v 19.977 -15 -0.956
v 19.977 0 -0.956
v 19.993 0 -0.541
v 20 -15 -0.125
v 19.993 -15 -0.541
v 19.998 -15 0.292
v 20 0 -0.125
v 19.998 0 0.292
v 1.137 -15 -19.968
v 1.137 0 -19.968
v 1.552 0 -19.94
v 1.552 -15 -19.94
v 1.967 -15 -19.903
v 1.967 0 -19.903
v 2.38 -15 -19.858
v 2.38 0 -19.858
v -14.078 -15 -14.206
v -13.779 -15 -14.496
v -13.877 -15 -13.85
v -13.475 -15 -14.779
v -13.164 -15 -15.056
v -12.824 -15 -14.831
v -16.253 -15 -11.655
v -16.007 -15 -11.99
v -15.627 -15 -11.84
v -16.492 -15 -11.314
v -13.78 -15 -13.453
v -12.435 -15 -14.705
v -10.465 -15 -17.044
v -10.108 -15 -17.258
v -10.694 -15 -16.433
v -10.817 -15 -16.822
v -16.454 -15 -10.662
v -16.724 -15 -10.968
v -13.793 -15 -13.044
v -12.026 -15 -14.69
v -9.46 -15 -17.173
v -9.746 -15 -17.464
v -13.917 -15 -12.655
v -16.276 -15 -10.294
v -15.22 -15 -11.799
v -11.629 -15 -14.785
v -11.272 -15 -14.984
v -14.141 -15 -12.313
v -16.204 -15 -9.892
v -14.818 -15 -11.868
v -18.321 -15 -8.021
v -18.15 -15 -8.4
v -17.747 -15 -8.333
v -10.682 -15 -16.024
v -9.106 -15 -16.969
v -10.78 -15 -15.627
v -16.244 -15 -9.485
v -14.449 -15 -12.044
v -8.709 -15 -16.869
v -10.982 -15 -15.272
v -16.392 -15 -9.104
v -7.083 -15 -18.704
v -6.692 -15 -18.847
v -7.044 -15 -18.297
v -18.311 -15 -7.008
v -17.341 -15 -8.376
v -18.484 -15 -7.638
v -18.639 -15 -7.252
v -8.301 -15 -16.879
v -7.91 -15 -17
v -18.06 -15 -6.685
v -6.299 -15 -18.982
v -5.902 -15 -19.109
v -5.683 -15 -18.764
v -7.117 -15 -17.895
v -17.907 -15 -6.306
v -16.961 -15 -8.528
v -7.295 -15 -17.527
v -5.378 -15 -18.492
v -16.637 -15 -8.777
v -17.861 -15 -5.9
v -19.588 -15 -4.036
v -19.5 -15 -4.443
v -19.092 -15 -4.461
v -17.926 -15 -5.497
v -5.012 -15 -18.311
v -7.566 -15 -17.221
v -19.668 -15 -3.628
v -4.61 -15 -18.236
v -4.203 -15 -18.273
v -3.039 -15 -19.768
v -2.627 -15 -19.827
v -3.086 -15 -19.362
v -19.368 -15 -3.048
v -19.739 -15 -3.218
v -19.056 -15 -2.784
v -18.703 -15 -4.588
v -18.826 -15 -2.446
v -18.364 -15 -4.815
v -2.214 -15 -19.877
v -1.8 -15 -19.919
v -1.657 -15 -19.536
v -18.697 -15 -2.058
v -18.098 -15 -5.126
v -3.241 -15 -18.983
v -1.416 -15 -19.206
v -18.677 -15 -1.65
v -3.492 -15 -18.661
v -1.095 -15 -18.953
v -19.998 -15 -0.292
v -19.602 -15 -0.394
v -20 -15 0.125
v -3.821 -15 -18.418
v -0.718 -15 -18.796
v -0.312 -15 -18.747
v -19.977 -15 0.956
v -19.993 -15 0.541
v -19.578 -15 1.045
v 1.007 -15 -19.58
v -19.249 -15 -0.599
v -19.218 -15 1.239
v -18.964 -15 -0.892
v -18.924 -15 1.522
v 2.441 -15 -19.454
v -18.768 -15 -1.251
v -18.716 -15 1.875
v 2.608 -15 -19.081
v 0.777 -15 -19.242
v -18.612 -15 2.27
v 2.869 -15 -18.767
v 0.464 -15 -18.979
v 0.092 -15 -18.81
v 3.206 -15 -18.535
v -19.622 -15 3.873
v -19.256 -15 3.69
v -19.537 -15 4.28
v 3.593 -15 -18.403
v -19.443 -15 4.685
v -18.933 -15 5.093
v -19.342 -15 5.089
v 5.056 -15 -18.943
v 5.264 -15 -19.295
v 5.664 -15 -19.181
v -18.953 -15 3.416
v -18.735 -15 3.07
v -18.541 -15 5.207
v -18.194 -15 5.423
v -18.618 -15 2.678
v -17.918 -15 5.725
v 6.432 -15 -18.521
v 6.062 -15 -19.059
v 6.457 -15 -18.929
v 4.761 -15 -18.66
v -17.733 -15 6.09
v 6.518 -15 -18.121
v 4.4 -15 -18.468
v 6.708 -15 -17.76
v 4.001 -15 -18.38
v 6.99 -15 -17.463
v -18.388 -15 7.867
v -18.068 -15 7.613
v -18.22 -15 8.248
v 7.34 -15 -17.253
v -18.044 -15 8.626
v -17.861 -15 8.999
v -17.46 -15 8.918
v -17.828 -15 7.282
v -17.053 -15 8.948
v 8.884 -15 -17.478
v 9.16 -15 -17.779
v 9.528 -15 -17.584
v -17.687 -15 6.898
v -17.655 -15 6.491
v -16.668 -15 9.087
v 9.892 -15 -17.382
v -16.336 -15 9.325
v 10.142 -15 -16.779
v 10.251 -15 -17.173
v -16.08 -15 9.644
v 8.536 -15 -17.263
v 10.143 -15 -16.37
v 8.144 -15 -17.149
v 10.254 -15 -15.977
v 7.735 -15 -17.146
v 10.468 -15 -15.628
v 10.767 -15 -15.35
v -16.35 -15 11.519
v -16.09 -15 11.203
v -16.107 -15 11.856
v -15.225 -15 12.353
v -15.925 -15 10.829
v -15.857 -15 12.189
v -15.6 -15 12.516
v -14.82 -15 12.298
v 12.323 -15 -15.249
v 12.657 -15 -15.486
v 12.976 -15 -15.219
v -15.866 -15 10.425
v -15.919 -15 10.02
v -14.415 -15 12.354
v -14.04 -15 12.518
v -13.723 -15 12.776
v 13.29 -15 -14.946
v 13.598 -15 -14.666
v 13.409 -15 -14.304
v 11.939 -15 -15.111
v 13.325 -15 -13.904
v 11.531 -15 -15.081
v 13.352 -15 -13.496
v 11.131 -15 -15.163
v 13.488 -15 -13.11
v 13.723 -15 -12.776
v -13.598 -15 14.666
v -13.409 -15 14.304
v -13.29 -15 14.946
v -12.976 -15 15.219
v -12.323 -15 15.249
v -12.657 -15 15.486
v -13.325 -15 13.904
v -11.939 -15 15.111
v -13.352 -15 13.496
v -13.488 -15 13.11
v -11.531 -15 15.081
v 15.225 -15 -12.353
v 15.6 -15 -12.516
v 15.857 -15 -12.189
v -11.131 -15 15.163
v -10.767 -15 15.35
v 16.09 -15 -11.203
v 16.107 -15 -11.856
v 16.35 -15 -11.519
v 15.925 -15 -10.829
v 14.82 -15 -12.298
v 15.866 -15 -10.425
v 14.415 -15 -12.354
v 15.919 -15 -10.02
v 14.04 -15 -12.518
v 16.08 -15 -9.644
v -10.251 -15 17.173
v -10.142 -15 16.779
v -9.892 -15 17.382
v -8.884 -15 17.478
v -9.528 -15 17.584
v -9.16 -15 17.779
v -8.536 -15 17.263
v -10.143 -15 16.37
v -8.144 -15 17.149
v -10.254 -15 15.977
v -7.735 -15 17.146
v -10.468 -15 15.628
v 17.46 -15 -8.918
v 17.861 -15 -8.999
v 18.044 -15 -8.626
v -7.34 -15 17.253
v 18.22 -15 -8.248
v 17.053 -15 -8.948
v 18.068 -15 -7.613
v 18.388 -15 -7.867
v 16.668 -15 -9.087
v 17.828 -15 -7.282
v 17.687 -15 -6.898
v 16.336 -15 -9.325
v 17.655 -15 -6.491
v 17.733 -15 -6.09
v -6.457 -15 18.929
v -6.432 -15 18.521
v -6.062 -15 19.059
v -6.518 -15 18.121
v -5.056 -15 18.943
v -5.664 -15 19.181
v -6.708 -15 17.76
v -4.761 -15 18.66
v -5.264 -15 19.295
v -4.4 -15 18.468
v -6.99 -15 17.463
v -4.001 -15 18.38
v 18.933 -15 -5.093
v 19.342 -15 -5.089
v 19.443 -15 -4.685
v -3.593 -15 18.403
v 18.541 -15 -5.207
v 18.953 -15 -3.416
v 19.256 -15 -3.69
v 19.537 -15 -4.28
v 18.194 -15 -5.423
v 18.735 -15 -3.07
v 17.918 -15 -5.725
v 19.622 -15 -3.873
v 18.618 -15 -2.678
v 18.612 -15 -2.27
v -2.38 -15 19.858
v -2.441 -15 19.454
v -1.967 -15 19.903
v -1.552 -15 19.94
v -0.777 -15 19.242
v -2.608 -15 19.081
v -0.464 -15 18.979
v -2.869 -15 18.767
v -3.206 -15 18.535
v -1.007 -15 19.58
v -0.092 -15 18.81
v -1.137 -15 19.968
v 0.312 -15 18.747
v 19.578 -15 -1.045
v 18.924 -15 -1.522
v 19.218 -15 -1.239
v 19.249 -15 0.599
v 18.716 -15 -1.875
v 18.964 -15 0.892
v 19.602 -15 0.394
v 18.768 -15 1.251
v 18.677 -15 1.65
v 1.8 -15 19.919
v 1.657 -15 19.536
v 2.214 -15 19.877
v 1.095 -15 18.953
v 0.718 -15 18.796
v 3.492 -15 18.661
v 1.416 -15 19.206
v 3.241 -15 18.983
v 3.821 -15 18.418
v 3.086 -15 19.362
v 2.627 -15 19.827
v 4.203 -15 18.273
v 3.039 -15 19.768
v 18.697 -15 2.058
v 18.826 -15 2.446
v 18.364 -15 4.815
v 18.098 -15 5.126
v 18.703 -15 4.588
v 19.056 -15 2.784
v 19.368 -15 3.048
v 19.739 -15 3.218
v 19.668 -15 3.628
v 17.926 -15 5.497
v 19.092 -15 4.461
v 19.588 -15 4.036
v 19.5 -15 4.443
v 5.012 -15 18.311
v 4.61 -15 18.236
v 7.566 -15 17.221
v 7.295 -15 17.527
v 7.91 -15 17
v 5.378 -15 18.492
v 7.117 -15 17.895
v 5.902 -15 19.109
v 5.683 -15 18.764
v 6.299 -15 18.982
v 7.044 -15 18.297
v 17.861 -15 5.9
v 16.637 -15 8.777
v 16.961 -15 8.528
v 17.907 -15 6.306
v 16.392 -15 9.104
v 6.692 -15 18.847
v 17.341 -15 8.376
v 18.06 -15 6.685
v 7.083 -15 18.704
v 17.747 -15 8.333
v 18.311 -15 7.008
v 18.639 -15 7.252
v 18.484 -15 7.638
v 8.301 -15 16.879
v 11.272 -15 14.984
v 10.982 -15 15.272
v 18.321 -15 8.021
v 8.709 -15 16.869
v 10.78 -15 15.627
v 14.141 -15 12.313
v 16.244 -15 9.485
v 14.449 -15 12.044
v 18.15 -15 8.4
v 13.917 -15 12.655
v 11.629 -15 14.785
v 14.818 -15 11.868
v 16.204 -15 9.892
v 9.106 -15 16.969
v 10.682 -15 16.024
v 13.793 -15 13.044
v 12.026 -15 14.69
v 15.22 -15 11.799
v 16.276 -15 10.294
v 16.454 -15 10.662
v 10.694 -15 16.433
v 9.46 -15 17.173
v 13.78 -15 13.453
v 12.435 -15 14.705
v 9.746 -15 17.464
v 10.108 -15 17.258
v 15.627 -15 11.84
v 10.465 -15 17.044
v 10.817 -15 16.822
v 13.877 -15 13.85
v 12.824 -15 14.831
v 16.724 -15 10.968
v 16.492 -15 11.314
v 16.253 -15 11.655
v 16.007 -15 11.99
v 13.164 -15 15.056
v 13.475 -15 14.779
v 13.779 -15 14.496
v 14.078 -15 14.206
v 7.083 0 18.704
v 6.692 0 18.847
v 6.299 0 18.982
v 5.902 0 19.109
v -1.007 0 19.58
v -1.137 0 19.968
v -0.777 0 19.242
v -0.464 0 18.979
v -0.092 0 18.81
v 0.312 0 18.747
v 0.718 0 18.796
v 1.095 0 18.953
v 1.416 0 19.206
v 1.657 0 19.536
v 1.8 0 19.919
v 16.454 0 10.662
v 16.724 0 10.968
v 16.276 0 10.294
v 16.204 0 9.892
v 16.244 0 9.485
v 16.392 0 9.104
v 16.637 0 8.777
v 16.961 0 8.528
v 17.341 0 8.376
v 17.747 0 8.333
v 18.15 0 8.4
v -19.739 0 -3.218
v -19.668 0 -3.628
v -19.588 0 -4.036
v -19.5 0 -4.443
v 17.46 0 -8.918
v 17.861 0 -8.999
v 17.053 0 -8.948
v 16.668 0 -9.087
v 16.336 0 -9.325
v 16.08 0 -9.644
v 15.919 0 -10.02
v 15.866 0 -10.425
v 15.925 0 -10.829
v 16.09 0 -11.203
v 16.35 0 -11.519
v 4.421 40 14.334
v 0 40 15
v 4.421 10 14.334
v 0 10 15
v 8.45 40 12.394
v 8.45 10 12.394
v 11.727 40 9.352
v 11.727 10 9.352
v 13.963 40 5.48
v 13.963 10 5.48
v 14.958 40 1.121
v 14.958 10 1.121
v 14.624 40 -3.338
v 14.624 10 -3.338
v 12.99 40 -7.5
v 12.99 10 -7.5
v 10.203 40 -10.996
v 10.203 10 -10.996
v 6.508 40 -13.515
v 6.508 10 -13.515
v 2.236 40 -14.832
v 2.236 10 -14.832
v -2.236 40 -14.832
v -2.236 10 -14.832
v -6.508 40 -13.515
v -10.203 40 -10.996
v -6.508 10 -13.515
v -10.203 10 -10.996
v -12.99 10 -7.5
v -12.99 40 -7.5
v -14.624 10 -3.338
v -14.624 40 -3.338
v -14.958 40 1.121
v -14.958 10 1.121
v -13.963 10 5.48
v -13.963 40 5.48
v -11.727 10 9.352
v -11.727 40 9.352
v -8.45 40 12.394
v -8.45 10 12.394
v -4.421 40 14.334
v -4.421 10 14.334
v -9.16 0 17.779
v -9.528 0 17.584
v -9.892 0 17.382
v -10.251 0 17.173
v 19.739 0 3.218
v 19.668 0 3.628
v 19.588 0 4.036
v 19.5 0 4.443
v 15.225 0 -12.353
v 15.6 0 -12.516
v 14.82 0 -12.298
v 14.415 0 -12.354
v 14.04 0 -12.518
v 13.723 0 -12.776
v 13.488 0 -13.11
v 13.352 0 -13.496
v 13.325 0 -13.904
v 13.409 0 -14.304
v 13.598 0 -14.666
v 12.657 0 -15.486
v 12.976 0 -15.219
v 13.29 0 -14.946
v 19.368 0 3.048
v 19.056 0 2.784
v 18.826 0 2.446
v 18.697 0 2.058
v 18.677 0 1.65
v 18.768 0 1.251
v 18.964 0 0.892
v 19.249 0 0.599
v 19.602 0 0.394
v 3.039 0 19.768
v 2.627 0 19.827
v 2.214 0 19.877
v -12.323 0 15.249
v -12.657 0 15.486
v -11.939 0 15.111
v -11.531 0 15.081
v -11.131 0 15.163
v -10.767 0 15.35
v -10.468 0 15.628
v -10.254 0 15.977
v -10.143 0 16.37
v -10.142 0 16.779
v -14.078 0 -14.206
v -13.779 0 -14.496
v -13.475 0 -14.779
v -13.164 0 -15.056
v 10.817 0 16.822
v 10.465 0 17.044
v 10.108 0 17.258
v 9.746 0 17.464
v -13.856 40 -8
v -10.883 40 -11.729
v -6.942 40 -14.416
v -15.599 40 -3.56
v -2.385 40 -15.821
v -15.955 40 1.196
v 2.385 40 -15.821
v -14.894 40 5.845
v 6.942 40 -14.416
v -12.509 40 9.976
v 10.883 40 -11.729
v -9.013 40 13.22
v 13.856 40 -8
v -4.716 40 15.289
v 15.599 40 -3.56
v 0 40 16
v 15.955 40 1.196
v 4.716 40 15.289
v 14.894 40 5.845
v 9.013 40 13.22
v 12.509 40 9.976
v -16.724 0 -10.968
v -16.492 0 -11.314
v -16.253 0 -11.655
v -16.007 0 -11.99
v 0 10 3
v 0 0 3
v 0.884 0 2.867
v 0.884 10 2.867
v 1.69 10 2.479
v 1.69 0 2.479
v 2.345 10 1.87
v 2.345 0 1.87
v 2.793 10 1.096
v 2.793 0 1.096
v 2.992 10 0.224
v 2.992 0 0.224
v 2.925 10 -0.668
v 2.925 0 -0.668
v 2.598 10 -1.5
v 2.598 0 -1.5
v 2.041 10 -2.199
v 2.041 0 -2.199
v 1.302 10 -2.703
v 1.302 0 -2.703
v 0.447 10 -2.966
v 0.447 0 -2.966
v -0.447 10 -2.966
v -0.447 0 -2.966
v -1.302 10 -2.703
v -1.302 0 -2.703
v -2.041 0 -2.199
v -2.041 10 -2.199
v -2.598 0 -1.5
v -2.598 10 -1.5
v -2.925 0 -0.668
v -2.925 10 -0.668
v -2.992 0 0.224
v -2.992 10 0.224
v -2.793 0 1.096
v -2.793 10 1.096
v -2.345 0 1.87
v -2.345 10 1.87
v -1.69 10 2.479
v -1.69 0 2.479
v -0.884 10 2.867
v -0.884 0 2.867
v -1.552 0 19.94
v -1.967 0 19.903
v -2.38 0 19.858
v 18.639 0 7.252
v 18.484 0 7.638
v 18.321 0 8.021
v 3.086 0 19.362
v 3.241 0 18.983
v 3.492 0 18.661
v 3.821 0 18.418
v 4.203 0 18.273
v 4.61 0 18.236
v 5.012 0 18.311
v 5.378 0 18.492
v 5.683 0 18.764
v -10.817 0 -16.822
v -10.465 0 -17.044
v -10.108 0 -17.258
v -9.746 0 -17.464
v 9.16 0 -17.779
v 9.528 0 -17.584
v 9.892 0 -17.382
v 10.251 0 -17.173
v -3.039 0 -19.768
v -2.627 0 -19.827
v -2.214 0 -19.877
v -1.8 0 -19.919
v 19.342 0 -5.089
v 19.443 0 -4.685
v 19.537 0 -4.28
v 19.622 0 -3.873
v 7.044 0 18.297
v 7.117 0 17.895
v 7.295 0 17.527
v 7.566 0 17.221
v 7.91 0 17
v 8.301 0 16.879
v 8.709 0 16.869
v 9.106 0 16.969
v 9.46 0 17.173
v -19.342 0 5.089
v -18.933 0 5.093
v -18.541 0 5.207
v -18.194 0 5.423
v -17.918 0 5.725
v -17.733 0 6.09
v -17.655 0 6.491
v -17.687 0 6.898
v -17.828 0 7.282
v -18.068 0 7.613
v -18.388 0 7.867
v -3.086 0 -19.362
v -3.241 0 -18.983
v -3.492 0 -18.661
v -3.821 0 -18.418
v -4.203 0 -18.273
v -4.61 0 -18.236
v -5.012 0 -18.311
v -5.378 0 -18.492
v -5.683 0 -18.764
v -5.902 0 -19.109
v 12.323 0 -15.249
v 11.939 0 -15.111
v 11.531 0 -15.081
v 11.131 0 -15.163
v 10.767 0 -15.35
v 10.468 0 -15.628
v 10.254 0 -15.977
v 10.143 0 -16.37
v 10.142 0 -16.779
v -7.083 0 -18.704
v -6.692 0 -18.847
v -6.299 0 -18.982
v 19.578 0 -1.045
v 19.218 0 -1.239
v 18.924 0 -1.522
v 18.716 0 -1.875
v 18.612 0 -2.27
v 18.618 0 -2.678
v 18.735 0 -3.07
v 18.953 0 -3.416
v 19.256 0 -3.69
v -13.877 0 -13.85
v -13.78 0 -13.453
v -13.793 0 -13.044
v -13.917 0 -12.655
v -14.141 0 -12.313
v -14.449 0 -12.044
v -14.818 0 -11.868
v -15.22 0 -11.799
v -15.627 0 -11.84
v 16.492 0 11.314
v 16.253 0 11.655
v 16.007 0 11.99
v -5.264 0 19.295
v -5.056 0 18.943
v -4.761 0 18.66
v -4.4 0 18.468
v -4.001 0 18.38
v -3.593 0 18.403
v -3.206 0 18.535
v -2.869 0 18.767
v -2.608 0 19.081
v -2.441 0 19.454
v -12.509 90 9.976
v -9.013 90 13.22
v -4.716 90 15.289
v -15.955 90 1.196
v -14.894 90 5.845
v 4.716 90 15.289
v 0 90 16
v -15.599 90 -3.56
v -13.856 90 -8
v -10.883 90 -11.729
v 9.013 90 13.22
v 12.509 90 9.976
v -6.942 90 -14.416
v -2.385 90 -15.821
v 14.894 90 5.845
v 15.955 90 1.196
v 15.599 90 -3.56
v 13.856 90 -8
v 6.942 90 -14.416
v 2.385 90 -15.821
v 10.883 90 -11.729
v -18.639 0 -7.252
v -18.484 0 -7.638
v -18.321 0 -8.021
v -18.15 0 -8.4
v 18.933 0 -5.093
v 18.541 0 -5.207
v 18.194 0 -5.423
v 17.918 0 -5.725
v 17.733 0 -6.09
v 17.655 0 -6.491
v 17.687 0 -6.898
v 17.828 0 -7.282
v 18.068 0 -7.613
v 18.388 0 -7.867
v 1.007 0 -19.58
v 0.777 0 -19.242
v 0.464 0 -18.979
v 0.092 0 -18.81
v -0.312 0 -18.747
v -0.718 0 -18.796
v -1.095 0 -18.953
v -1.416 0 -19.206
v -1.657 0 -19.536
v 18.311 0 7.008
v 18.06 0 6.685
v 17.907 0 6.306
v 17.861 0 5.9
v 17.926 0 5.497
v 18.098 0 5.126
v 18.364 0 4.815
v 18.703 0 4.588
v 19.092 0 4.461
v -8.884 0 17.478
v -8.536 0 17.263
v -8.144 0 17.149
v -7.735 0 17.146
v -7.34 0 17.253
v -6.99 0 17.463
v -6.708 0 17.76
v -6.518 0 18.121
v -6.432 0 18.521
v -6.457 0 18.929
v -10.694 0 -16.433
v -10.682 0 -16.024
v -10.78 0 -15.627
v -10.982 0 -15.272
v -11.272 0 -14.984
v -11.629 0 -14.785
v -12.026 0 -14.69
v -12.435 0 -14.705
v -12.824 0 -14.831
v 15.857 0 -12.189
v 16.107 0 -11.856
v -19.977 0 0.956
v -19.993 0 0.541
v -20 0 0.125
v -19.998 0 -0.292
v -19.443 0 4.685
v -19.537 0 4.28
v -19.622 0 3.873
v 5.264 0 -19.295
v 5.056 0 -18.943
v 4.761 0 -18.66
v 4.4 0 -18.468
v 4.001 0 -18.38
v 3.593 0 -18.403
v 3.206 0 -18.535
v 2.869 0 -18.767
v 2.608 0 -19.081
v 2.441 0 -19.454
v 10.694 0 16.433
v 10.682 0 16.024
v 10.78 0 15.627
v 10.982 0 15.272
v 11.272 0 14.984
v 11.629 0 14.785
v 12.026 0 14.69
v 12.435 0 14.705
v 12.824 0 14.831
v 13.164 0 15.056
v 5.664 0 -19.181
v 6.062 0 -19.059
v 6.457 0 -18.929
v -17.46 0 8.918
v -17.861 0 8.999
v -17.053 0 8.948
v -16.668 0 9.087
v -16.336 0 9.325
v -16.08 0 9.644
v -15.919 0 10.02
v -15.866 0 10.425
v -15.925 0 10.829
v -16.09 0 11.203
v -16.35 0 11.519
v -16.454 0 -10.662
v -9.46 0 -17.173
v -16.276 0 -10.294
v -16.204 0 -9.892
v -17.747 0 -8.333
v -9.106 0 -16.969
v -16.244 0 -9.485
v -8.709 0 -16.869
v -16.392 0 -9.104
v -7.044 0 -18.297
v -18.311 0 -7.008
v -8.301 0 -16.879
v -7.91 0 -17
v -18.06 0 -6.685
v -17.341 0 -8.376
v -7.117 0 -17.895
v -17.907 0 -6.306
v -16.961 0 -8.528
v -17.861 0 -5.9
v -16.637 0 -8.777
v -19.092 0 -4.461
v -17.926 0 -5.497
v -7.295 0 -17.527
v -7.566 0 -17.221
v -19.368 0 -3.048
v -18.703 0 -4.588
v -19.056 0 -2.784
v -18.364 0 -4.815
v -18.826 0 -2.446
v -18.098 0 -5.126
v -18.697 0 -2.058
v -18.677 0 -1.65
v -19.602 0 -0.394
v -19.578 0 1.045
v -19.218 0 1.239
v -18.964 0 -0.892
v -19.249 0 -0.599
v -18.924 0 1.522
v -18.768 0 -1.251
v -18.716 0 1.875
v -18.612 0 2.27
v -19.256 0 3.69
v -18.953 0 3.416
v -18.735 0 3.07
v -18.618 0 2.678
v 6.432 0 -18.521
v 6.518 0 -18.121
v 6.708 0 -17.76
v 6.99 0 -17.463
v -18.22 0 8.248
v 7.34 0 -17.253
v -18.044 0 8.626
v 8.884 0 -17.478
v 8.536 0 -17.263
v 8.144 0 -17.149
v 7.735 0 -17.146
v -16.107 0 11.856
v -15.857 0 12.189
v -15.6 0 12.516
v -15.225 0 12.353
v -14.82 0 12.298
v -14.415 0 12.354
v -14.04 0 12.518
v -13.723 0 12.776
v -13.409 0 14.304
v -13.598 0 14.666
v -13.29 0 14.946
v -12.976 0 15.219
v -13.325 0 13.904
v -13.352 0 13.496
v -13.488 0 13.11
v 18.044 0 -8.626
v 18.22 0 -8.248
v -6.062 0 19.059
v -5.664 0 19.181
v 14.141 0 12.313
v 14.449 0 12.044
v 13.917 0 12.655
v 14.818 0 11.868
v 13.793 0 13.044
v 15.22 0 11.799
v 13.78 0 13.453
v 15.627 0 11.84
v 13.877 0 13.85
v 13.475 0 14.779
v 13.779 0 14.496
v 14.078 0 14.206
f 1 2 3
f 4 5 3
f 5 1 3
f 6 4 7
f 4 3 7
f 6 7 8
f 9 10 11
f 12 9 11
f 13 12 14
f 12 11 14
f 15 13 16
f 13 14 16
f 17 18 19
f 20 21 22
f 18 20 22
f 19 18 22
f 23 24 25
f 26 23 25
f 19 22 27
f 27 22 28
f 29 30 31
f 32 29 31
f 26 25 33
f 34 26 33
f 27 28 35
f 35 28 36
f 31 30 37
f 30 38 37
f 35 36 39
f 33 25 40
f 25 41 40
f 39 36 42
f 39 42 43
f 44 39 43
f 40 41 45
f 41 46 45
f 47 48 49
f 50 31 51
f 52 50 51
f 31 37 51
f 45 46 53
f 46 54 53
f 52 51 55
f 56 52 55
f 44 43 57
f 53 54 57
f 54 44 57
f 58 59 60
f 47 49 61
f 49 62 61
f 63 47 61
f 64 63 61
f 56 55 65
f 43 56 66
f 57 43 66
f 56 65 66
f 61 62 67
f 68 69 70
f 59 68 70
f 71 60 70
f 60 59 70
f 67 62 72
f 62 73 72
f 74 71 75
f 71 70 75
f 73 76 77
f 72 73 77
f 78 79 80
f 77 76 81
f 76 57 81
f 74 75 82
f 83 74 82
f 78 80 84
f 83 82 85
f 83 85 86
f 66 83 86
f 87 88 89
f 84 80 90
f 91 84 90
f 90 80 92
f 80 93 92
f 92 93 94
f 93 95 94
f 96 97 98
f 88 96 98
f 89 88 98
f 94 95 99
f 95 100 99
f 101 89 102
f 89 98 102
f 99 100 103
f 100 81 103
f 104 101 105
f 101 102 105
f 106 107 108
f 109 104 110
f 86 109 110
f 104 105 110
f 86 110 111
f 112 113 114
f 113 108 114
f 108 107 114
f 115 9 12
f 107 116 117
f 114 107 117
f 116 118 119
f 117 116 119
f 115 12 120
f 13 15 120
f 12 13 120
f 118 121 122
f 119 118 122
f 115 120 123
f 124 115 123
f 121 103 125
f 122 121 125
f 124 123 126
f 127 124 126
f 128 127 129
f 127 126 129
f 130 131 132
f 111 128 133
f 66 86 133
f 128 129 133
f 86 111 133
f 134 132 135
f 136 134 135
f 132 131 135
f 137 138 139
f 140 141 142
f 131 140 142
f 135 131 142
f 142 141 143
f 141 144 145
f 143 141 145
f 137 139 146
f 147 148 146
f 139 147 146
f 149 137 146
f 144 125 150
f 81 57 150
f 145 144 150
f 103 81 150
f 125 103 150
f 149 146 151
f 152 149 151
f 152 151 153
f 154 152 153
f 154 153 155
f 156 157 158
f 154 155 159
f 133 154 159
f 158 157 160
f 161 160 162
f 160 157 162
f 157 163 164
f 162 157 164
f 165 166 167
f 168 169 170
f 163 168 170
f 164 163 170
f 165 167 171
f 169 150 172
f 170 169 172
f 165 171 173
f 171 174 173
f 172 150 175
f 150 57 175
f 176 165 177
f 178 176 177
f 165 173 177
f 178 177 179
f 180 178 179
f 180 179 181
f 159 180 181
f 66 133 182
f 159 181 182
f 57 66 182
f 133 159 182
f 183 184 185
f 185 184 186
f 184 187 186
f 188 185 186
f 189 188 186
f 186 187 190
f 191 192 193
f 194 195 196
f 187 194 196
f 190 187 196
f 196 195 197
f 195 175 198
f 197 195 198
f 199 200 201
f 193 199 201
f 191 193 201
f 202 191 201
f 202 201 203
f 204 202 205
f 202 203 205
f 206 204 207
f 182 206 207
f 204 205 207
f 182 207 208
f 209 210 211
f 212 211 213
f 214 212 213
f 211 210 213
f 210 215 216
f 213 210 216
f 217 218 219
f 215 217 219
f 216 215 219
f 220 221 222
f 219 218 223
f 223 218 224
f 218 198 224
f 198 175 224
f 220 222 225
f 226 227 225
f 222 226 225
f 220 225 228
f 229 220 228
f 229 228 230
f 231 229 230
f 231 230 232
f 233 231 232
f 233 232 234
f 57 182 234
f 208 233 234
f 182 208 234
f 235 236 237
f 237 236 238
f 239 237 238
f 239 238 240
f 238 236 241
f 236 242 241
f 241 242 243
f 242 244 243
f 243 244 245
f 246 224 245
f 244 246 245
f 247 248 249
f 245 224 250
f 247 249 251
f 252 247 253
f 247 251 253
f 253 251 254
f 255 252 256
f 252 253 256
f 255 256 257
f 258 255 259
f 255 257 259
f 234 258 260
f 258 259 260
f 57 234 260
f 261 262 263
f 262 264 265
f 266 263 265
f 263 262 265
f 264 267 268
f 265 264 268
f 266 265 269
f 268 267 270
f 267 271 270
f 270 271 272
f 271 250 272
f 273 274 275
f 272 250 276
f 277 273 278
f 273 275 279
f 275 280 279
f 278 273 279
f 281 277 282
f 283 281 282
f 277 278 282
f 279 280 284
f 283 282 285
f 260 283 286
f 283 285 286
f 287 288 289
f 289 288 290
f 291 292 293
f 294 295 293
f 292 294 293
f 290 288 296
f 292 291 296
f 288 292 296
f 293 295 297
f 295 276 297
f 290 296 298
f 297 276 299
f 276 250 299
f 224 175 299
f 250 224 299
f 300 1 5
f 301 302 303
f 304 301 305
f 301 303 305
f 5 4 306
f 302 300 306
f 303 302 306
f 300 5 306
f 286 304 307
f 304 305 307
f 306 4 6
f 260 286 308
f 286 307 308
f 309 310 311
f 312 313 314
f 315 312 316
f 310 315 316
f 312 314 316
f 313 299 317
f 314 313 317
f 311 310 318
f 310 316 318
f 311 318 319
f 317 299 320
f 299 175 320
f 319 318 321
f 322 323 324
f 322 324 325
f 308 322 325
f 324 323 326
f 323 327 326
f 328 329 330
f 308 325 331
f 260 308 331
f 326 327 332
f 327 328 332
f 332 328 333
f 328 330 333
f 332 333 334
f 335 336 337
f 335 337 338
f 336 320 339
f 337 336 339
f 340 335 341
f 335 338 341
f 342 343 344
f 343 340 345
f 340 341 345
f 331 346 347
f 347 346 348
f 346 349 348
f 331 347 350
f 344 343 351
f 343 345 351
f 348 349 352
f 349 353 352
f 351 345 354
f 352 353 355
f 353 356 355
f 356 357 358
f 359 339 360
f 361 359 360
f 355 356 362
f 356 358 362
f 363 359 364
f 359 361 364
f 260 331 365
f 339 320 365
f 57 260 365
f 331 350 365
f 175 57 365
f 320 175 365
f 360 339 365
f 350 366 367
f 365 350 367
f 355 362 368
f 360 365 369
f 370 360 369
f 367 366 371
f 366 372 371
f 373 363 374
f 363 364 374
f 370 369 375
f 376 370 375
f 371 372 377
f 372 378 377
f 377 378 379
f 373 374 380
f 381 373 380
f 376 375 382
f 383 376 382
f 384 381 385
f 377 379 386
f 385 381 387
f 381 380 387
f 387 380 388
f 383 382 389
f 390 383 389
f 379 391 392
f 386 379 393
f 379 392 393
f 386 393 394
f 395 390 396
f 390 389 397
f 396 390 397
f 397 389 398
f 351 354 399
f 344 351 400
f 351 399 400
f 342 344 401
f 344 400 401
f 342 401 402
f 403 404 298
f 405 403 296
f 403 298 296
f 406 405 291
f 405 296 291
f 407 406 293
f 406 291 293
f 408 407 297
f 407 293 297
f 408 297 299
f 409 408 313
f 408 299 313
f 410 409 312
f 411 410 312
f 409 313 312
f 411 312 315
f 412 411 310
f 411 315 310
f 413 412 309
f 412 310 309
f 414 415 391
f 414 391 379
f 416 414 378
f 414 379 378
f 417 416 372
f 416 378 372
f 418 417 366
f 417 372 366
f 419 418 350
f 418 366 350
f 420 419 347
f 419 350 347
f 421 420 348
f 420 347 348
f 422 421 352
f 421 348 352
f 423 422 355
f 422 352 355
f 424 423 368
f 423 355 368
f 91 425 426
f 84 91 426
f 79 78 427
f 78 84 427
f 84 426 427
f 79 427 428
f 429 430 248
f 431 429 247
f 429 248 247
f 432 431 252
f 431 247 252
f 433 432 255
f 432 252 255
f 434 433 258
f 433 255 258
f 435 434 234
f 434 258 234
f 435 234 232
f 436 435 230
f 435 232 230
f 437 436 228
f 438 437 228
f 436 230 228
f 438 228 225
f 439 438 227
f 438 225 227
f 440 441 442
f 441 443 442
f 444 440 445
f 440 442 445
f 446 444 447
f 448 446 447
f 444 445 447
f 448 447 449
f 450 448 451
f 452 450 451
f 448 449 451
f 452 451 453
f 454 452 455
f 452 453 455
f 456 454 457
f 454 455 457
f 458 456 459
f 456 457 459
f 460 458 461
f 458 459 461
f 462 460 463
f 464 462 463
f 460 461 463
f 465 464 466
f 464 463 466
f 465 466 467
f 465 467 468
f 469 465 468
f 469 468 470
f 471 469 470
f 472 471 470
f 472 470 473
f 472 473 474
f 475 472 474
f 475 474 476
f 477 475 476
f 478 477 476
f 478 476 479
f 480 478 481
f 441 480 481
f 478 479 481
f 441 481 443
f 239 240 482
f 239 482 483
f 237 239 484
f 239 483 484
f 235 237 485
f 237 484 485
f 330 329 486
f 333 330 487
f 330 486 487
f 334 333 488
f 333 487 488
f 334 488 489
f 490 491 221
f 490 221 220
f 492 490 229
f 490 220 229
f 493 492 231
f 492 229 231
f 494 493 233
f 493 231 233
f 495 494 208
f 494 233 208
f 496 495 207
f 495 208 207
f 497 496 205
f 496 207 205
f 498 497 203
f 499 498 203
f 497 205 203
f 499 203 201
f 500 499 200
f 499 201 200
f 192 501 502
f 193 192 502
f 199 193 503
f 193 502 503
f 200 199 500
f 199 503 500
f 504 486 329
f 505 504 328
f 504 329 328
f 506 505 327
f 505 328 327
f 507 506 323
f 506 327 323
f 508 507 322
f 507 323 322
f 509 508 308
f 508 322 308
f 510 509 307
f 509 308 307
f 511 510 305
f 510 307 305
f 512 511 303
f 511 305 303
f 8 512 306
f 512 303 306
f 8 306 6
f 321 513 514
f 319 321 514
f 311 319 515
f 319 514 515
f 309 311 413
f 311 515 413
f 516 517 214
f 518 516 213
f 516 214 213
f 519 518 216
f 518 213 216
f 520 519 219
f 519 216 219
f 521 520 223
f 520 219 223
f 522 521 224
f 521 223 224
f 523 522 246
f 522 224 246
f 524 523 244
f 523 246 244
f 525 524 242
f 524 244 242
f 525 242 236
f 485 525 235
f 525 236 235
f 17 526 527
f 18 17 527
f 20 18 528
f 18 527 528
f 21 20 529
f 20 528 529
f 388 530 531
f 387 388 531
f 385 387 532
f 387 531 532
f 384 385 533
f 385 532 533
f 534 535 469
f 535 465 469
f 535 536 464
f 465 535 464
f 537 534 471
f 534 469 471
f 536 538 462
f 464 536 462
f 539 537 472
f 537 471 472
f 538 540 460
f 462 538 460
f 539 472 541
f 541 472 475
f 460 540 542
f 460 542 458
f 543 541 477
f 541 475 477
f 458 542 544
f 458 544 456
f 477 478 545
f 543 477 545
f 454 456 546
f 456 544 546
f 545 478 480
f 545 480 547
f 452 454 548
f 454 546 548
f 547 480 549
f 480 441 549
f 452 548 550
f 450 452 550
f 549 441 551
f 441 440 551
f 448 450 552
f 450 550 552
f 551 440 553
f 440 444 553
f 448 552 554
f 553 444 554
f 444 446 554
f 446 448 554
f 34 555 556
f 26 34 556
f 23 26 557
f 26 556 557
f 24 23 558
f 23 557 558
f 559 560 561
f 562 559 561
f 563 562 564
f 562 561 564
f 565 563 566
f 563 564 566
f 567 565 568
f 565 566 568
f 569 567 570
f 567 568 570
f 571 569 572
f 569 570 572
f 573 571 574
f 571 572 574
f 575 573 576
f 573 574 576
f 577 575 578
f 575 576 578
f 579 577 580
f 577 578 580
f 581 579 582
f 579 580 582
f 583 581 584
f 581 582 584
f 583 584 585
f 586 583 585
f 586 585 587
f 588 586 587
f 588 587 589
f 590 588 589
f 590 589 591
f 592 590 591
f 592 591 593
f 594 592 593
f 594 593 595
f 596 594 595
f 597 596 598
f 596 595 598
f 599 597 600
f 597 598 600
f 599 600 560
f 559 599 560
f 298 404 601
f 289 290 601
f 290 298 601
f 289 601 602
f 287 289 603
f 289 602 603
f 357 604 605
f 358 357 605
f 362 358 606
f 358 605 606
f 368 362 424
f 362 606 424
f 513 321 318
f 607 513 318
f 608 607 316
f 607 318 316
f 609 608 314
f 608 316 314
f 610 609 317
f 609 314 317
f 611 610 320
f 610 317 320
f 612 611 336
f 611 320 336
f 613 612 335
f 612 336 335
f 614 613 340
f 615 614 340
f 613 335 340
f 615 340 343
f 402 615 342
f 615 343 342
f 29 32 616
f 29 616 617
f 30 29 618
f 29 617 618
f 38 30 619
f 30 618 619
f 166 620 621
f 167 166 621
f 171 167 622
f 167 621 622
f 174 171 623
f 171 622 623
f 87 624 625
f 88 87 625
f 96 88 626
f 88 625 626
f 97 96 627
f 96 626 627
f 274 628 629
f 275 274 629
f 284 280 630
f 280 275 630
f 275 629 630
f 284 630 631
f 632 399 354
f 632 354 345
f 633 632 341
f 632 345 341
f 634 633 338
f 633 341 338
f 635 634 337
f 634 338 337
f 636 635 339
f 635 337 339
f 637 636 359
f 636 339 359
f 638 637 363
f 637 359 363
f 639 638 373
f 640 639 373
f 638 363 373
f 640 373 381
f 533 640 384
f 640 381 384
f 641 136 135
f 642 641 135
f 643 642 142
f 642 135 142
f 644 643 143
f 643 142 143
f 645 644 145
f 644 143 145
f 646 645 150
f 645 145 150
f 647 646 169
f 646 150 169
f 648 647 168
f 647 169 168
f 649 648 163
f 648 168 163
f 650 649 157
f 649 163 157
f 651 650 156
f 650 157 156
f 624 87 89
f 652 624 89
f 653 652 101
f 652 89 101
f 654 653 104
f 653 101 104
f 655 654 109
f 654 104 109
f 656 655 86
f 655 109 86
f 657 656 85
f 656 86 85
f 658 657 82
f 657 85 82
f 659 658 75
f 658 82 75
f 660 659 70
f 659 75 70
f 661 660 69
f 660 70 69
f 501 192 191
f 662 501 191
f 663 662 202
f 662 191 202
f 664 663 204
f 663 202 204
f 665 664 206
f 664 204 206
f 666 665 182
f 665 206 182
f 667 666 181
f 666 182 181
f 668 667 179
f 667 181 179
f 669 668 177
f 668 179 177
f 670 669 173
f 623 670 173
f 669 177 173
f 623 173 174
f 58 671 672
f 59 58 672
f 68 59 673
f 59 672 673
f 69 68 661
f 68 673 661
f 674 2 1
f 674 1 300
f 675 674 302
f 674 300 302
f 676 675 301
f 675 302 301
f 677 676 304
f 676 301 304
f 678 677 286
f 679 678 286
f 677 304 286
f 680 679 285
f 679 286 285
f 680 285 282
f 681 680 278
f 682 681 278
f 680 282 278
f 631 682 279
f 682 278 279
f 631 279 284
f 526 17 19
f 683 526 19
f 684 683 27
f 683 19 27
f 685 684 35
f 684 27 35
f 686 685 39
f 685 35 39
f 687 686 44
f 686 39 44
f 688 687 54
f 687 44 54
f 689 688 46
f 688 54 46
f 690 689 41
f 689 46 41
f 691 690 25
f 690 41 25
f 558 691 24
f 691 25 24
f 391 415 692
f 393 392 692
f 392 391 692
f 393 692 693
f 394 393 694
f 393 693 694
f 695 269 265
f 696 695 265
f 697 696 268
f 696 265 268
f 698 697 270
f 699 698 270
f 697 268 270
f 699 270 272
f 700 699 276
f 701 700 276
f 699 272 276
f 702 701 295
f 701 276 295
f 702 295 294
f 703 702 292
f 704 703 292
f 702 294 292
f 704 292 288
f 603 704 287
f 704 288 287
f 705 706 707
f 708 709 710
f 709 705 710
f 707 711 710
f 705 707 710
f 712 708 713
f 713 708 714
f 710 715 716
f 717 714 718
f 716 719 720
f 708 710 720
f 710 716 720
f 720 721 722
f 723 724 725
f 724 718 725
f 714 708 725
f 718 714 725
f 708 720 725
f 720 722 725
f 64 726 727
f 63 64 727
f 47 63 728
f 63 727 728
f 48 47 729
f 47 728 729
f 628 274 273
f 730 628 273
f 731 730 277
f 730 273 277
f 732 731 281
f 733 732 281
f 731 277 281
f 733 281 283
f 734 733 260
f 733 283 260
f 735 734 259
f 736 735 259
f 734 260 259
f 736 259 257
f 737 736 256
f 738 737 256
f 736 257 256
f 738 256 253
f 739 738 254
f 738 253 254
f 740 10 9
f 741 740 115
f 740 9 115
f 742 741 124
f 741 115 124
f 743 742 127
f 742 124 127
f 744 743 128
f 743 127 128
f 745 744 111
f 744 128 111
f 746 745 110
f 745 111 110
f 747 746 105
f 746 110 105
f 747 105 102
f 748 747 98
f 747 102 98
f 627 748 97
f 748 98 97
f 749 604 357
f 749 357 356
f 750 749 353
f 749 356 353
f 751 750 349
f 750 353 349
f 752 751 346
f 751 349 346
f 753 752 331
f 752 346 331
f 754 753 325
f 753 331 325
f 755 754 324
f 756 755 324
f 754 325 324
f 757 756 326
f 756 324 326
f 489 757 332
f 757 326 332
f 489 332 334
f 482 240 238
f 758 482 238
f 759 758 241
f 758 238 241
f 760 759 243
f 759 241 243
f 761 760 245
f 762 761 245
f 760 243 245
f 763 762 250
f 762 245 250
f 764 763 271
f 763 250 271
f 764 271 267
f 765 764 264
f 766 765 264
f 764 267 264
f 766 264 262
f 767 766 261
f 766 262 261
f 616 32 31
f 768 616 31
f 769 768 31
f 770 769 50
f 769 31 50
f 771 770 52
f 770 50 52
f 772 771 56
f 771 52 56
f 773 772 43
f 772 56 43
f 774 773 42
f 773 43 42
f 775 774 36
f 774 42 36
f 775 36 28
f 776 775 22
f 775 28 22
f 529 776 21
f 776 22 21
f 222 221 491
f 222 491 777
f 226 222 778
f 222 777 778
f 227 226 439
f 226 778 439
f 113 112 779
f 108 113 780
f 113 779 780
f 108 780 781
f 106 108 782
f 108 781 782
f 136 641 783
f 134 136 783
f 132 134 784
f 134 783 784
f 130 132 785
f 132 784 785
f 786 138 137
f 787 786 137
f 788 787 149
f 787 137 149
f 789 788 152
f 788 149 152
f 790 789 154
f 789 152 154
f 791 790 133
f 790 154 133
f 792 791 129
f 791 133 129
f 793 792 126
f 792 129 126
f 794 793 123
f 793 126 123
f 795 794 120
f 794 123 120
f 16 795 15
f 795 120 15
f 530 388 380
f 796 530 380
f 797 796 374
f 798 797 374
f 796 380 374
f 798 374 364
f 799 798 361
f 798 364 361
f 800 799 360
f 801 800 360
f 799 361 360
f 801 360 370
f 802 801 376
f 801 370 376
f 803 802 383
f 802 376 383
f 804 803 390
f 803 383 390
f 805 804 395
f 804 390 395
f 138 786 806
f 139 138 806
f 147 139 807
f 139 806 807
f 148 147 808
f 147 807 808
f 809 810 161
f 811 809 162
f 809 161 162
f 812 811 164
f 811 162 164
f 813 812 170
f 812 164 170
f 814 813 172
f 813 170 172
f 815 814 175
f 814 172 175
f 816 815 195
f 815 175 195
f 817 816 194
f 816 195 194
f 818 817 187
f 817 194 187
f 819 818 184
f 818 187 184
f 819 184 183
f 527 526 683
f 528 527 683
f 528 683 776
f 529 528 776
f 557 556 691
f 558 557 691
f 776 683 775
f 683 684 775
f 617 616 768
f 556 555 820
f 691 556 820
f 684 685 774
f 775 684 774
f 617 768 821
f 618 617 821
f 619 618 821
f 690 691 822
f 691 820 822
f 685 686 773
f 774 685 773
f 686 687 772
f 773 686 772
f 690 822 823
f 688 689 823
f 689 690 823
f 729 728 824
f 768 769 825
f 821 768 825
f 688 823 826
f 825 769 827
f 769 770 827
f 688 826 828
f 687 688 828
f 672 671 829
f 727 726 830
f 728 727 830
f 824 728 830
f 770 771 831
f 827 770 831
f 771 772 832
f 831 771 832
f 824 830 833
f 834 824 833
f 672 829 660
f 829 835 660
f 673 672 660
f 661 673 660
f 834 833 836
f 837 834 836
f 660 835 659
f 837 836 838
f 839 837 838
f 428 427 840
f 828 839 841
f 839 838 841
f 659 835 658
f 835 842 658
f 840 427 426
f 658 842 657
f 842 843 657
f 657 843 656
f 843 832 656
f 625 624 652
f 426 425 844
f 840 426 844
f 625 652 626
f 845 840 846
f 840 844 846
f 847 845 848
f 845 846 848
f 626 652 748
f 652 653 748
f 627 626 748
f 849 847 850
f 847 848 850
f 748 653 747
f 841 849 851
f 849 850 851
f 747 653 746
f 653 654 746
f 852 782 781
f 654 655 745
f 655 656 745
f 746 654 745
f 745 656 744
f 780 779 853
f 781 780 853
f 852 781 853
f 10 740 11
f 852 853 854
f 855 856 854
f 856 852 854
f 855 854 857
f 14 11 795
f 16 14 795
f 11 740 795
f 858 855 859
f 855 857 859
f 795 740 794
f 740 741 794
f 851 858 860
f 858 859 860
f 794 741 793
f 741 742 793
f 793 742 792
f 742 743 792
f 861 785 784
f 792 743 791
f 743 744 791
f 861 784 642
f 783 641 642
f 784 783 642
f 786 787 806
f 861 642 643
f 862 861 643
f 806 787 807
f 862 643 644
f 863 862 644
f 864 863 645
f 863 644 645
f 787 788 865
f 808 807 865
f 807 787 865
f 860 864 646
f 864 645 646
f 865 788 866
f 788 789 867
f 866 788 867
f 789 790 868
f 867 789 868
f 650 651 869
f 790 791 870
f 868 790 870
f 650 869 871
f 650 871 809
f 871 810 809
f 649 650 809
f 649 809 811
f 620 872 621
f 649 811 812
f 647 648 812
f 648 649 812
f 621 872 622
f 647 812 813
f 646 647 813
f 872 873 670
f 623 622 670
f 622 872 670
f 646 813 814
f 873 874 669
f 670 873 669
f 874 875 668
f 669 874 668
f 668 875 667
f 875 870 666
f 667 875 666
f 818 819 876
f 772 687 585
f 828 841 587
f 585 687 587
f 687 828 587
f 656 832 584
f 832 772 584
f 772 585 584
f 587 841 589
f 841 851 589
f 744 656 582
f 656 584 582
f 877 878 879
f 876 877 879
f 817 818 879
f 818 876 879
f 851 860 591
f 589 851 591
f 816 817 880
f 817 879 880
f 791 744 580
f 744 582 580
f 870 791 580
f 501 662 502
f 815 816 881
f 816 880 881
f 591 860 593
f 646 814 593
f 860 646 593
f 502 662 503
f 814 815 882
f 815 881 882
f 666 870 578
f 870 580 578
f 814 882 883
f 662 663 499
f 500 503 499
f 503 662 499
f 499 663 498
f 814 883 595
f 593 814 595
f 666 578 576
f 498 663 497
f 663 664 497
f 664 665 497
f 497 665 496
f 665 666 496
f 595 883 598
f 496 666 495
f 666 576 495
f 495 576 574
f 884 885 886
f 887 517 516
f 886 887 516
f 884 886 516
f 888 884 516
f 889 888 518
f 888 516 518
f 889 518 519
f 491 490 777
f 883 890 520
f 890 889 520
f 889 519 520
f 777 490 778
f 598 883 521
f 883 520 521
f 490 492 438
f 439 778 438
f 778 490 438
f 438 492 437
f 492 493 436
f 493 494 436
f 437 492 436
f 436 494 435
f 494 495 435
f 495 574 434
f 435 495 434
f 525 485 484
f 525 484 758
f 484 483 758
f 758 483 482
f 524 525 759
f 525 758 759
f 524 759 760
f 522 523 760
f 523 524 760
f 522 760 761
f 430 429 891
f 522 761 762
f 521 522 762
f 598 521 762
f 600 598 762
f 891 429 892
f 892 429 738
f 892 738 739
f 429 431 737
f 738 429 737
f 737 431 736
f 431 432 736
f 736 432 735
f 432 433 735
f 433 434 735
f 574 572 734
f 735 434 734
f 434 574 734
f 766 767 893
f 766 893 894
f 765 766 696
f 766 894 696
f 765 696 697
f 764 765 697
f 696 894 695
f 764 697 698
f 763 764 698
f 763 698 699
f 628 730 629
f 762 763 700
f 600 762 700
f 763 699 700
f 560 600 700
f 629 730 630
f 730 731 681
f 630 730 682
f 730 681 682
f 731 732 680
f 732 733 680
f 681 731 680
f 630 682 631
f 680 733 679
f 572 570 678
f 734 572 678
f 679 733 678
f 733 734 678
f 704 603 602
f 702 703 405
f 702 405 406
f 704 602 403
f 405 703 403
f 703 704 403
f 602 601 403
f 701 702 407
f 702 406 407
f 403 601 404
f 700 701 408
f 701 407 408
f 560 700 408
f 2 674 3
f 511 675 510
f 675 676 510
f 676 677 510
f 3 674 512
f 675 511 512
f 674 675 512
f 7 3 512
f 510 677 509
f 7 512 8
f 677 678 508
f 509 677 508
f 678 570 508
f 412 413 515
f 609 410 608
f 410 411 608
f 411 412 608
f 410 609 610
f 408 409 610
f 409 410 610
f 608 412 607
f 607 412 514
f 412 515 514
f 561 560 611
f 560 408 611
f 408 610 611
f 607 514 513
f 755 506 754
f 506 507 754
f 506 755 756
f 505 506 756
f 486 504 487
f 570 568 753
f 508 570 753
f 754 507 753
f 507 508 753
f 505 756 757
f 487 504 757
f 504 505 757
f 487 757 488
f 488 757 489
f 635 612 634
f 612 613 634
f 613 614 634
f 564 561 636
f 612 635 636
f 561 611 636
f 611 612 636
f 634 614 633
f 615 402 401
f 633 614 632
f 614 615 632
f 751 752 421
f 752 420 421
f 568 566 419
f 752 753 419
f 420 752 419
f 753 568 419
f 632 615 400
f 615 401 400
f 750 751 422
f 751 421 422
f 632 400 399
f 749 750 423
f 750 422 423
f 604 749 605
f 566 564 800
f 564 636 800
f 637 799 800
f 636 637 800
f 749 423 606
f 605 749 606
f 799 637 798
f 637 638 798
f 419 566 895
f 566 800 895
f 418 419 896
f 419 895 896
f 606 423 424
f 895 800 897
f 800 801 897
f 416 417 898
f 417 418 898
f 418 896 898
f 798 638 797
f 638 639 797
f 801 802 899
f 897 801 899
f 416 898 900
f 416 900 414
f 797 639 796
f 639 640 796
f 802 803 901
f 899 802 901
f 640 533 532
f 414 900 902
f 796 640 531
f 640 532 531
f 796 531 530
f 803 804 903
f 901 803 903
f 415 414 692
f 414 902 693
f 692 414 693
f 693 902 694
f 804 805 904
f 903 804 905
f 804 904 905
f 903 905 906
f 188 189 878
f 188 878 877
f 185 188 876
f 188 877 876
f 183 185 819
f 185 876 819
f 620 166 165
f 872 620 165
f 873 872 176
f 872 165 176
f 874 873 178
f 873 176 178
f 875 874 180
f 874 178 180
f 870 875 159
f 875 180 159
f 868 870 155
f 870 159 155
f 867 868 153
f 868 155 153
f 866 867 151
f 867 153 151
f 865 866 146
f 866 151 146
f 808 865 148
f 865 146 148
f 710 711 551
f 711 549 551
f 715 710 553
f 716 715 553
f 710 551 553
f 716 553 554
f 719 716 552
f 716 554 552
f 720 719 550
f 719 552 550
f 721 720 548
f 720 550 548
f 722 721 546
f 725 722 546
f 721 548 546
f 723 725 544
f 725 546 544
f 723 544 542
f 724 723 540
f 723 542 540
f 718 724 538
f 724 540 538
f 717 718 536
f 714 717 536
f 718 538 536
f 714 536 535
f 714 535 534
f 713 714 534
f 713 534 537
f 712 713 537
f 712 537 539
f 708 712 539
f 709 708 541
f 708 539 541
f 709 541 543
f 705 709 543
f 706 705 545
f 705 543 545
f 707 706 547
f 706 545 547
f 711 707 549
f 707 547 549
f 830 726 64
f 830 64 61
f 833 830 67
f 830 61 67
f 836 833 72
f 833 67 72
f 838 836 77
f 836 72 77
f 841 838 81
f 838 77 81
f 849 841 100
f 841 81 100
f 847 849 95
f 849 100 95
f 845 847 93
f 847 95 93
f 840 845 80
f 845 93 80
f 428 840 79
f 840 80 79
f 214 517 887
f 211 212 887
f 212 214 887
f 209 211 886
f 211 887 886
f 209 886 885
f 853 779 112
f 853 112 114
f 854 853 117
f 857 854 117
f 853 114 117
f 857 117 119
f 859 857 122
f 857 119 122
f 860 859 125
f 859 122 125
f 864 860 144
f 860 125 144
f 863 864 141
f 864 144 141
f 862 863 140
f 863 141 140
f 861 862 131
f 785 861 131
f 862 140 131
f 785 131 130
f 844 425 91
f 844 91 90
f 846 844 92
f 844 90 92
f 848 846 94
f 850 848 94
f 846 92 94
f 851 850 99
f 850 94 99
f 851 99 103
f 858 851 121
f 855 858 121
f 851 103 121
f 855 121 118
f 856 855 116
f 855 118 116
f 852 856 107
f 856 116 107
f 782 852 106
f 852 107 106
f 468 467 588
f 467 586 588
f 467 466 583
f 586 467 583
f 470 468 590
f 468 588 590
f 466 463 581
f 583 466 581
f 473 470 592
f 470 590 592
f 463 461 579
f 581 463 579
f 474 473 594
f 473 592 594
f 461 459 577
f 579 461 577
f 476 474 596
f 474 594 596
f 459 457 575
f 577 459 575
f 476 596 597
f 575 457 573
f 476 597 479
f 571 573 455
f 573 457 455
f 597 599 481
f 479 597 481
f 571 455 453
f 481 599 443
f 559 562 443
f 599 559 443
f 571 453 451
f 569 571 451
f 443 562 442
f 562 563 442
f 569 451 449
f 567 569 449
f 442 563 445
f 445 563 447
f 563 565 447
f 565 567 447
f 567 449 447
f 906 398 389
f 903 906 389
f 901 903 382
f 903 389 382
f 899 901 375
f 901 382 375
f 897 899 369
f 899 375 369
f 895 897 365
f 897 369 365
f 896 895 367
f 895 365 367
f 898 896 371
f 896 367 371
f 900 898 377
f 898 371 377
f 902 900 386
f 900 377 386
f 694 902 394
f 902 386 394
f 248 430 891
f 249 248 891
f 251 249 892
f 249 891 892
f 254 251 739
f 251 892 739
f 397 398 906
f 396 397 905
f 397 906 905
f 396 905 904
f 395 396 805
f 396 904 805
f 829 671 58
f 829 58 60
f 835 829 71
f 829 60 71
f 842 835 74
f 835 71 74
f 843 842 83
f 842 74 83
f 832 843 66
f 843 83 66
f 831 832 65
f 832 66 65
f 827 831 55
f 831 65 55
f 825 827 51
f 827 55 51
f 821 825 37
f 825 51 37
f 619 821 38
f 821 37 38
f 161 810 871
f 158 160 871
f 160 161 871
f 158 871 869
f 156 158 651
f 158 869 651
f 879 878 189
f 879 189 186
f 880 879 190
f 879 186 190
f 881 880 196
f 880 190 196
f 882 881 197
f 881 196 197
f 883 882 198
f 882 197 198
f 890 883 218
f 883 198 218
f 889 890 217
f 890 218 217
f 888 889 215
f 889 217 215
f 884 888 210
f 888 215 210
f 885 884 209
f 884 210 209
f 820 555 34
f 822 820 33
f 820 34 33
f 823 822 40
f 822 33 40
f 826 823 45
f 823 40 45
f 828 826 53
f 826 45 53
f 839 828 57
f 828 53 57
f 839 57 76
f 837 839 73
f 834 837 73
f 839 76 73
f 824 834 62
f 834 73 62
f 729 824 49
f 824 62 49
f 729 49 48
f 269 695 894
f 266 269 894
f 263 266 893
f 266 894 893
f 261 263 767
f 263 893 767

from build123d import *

# Parameters (mm, degrees)
F0_R     = 20
F0_R_2   = 3
F1_DEPTH = 15
F2_R     = 1.5
F3_DEPTH = 15
F4_COUNT = 30


with BuildPart() as f1:
    # F0 (on Front) → F1 (new body)
    with BuildSketch(Plane.XZ):
        Circle(F0_R)
        Circle(F0_R_2, mode=Mode.SUBTRACT)
    extrude(amount=F1_DEPTH)


with BuildPart() as f3:
    # F2 (on face) → F3 (new body, through all)
    with BuildSketch(Plane.XZ.offset(15)):
        with Locations((20.171481, 1.781533)):
            Circle(F2_R)
    extrude(amount=-F3_DEPTH)


with BuildPart() as f4_1:
    # F4: instance of F3
    add(f3.part.rotate(Axis((0, 0, 0), (0, 1, 0)), 1 * 360 / F4_COUNT))


with BuildPart() as f4_2:
    # F4: instance of F3
    add(f3.part.rotate(Axis((0, 0, 0), (0, 1, 0)), 2 * 360 / F4_COUNT))


with BuildPart() as f4_3:
    # F4: instance of F3
    add(f3.part.rotate(Axis((0, 0, 0), (0, 1, 0)), 3 * 360 / F4_COUNT))


with BuildPart() as f4_4:
    # F4: instance of F3
    add(f3.part.rotate(Axis((0, 0, 0), (0, 1, 0)), 4 * 360 / F4_COUNT))


with BuildPart() as f4_5:
    # F4: instance of F3
    add(f3.part.rotate(Axis((0, 0, 0), (0, 1, 0)), 5 * 360 / F4_COUNT))


with BuildPart() as f4_6:
    # F4: instance of F3
    add(f3.part.rotate(Axis((0, 0, 0), (0, 1, 0)), 6 * 360 / F4_COUNT))


with BuildPart() as f4_7:
    # F4: instance of F3
    add(f3.part.rotate(Axis((0, 0, 0), (0, 1, 0)), 7 * 360 / F4_COUNT))


with BuildPart() as f4_8:
    # F4: instance of F3
    add(f3.part.rotate(Axis((0, 0, 0), (0, 1, 0)), 8 * 360 / F4_COUNT))


with BuildPart() as f4_9:
    # F4: instance of F3
    add(f3.part.rotate(Axis((0, 0, 0), (0, 1, 0)), 9 * 360 / F4_COUNT))


with BuildPart() as f4_10:
    # F4: instance of F3
    add(f3.part.rotate(Axis((0, 0, 0), (0, 1, 0)), 10 * 360 / F4_COUNT))


with BuildPart() as f4_11:
    # F4: instance of F3
    add(f3.part.rotate(Axis((0, 0, 0), (0, 1, 0)), 11 * 360 / F4_COUNT))


with BuildPart() as f4_12:
    # F4: instance of F3
    add(f3.part.rotate(Axis((0, 0, 0), (0, 1, 0)), 12 * 360 / F4_COUNT))


with BuildPart() as f4_13:
    # F4: instance of F3
    add(f3.part.rotate(Axis((0, 0, 0), (0, 1, 0)), 13 * 360 / F4_COUNT))


with BuildPart() as f4_14:
    # F4: instance of F3
    add(f3.part.rotate(Axis((0, 0, 0), (0, 1, 0)), 14 * 360 / F4_COUNT))


with BuildPart() as f4_15:
    # F4: instance of F3
    add(f3.part.rotate(Axis((0, 0, 0), (0, 1, 0)), 15 * 360 / F4_COUNT))


with BuildPart() as f4_16:
    # F4: instance of F3
    add(f3.part.rotate(Axis((0, 0, 0), (0, 1, 0)), 16 * 360 / F4_COUNT))


with BuildPart() as f4_17:
    # F4: instance of F3
    add(f3.part.rotate(Axis((0, 0, 0), (0, 1, 0)), 17 * 360 / F4_COUNT))


with BuildPart() as f4_18:
    # F4: instance of F3
    add(f3.part.rotate(Axis((0, 0, 0), (0, 1, 0)), 18 * 360 / F4_COUNT))


with BuildPart() as f4_19:
    # F4: instance of F3
    add(f3.part.rotate(Axis((0, 0, 0), (0, 1, 0)), 19 * 360 / F4_COUNT))


with BuildPart() as f4_20:
    # F4: instance of F3
    add(f3.part.rotate(Axis((0, 0, 0), (0, 1, 0)), 20 * 360 / F4_COUNT))


with BuildPart() as f4_21:
    # F4: instance of F3
    add(f3.part.rotate(Axis((0, 0, 0), (0, 1, 0)), 21 * 360 / F4_COUNT))


with BuildPart() as f4_22:
    # F4: instance of F3
    add(f3.part.rotate(Axis((0, 0, 0), (0, 1, 0)), 22 * 360 / F4_COUNT))


with BuildPart() as f4_23:
    # F4: instance of F3
    add(f3.part.rotate(Axis((0, 0, 0), (0, 1, 0)), 23 * 360 / F4_COUNT))


with BuildPart() as f4_24:
    # F4: instance of F3
    add(f3.part.rotate(Axis((0, 0, 0), (0, 1, 0)), 24 * 360 / F4_COUNT))


with BuildPart() as f4_25:
    # F4: instance of F3
    add(f3.part.rotate(Axis((0, 0, 0), (0, 1, 0)), 25 * 360 / F4_COUNT))


with BuildPart() as f4_26:
    # F4: instance of F3
    add(f3.part.rotate(Axis((0, 0, 0), (0, 1, 0)), 26 * 360 / F4_COUNT))


with BuildPart() as f4_27:
    # F4: instance of F3
    add(f3.part.rotate(Axis((0, 0, 0), (0, 1, 0)), 27 * 360 / F4_COUNT))


with BuildPart() as f4_28:
    # F4: instance of F3
    add(f3.part.rotate(Axis((0, 0, 0), (0, 1, 0)), 28 * 360 / F4_COUNT))


with BuildPart() as f4_29:
    # F4: instance of F3
    add(f3.part.rotate(Axis((0, 0, 0), (0, 1, 0)), 29 * 360 / F4_COUNT))


with BuildPart() as f1_1:
    add(f1.part)

    # F5: cut F4_15, F4_16, F4_17, F4_18, F4_19, F4_20, F4_21, F4_23, F4_25, F4_22, F4_24, F4_26, F4_27, F4_28, F4_29, F3, F4_1, F4_2, F4_3, F4_4, F4_5, F4_6, F4_7, F4_8, F4_9, F4_10, F4_11, F4_12, F4_13, F4_14
    add(f4_15.part, mode=Mode.SUBTRACT)
    add(f4_16.part, mode=Mode.SUBTRACT)
    add(f4_17.part, mode=Mode.SUBTRACT)
    add(f4_18.part, mode=Mode.SUBTRACT)
    add(f4_19.part, mode=Mode.SUBTRACT)
    add(f4_20.part, mode=Mode.SUBTRACT)
    add(f4_21.part, mode=Mode.SUBTRACT)
    add(f4_23.part, mode=Mode.SUBTRACT)
    add(f4_25.part, mode=Mode.SUBTRACT)
    add(f4_22.part, mode=Mode.SUBTRACT)
    add(f4_24.part, mode=Mode.SUBTRACT)
    add(f4_26.part, mode=Mode.SUBTRACT)
    add(f4_27.part, mode=Mode.SUBTRACT)
    add(f4_28.part, mode=Mode.SUBTRACT)
    add(f4_29.part, mode=Mode.SUBTRACT)
    add(f3.part, mode=Mode.SUBTRACT)
    add(f4_1.part, mode=Mode.SUBTRACT)
    add(f4_2.part, mode=Mode.SUBTRACT)
    add(f4_3.part, mode=Mode.SUBTRACT)
    add(f4_4.part, mode=Mode.SUBTRACT)
    add(f4_5.part, mode=Mode.SUBTRACT)
    add(f4_6.part, mode=Mode.SUBTRACT)
    add(f4_7.part, mode=Mode.SUBTRACT)
    add(f4_8.part, mode=Mode.SUBTRACT)
    add(f4_9.part, mode=Mode.SUBTRACT)
    add(f4_10.part, mode=Mode.SUBTRACT)
    add(f4_11.part, mode=Mode.SUBTRACT)
    add(f4_12.part, mode=Mode.SUBTRACT)
    add(f4_13.part, mode=Mode.SUBTRACT)
    add(f4_14.part, mode=Mode.SUBTRACT)

    # F6 (on Right) → F7 (revolve)
    with BuildSketch(Plane.YZ):
        Polygon((-15, 3), (-15, 0), (90, 0), (90, 16), (40, 16), (40, 15), (10, 15), (10, 3), align=None)
    revolve(axis=Axis((0, 37.5, 0), (0, 1, 0)))


solid = f1_1.part
